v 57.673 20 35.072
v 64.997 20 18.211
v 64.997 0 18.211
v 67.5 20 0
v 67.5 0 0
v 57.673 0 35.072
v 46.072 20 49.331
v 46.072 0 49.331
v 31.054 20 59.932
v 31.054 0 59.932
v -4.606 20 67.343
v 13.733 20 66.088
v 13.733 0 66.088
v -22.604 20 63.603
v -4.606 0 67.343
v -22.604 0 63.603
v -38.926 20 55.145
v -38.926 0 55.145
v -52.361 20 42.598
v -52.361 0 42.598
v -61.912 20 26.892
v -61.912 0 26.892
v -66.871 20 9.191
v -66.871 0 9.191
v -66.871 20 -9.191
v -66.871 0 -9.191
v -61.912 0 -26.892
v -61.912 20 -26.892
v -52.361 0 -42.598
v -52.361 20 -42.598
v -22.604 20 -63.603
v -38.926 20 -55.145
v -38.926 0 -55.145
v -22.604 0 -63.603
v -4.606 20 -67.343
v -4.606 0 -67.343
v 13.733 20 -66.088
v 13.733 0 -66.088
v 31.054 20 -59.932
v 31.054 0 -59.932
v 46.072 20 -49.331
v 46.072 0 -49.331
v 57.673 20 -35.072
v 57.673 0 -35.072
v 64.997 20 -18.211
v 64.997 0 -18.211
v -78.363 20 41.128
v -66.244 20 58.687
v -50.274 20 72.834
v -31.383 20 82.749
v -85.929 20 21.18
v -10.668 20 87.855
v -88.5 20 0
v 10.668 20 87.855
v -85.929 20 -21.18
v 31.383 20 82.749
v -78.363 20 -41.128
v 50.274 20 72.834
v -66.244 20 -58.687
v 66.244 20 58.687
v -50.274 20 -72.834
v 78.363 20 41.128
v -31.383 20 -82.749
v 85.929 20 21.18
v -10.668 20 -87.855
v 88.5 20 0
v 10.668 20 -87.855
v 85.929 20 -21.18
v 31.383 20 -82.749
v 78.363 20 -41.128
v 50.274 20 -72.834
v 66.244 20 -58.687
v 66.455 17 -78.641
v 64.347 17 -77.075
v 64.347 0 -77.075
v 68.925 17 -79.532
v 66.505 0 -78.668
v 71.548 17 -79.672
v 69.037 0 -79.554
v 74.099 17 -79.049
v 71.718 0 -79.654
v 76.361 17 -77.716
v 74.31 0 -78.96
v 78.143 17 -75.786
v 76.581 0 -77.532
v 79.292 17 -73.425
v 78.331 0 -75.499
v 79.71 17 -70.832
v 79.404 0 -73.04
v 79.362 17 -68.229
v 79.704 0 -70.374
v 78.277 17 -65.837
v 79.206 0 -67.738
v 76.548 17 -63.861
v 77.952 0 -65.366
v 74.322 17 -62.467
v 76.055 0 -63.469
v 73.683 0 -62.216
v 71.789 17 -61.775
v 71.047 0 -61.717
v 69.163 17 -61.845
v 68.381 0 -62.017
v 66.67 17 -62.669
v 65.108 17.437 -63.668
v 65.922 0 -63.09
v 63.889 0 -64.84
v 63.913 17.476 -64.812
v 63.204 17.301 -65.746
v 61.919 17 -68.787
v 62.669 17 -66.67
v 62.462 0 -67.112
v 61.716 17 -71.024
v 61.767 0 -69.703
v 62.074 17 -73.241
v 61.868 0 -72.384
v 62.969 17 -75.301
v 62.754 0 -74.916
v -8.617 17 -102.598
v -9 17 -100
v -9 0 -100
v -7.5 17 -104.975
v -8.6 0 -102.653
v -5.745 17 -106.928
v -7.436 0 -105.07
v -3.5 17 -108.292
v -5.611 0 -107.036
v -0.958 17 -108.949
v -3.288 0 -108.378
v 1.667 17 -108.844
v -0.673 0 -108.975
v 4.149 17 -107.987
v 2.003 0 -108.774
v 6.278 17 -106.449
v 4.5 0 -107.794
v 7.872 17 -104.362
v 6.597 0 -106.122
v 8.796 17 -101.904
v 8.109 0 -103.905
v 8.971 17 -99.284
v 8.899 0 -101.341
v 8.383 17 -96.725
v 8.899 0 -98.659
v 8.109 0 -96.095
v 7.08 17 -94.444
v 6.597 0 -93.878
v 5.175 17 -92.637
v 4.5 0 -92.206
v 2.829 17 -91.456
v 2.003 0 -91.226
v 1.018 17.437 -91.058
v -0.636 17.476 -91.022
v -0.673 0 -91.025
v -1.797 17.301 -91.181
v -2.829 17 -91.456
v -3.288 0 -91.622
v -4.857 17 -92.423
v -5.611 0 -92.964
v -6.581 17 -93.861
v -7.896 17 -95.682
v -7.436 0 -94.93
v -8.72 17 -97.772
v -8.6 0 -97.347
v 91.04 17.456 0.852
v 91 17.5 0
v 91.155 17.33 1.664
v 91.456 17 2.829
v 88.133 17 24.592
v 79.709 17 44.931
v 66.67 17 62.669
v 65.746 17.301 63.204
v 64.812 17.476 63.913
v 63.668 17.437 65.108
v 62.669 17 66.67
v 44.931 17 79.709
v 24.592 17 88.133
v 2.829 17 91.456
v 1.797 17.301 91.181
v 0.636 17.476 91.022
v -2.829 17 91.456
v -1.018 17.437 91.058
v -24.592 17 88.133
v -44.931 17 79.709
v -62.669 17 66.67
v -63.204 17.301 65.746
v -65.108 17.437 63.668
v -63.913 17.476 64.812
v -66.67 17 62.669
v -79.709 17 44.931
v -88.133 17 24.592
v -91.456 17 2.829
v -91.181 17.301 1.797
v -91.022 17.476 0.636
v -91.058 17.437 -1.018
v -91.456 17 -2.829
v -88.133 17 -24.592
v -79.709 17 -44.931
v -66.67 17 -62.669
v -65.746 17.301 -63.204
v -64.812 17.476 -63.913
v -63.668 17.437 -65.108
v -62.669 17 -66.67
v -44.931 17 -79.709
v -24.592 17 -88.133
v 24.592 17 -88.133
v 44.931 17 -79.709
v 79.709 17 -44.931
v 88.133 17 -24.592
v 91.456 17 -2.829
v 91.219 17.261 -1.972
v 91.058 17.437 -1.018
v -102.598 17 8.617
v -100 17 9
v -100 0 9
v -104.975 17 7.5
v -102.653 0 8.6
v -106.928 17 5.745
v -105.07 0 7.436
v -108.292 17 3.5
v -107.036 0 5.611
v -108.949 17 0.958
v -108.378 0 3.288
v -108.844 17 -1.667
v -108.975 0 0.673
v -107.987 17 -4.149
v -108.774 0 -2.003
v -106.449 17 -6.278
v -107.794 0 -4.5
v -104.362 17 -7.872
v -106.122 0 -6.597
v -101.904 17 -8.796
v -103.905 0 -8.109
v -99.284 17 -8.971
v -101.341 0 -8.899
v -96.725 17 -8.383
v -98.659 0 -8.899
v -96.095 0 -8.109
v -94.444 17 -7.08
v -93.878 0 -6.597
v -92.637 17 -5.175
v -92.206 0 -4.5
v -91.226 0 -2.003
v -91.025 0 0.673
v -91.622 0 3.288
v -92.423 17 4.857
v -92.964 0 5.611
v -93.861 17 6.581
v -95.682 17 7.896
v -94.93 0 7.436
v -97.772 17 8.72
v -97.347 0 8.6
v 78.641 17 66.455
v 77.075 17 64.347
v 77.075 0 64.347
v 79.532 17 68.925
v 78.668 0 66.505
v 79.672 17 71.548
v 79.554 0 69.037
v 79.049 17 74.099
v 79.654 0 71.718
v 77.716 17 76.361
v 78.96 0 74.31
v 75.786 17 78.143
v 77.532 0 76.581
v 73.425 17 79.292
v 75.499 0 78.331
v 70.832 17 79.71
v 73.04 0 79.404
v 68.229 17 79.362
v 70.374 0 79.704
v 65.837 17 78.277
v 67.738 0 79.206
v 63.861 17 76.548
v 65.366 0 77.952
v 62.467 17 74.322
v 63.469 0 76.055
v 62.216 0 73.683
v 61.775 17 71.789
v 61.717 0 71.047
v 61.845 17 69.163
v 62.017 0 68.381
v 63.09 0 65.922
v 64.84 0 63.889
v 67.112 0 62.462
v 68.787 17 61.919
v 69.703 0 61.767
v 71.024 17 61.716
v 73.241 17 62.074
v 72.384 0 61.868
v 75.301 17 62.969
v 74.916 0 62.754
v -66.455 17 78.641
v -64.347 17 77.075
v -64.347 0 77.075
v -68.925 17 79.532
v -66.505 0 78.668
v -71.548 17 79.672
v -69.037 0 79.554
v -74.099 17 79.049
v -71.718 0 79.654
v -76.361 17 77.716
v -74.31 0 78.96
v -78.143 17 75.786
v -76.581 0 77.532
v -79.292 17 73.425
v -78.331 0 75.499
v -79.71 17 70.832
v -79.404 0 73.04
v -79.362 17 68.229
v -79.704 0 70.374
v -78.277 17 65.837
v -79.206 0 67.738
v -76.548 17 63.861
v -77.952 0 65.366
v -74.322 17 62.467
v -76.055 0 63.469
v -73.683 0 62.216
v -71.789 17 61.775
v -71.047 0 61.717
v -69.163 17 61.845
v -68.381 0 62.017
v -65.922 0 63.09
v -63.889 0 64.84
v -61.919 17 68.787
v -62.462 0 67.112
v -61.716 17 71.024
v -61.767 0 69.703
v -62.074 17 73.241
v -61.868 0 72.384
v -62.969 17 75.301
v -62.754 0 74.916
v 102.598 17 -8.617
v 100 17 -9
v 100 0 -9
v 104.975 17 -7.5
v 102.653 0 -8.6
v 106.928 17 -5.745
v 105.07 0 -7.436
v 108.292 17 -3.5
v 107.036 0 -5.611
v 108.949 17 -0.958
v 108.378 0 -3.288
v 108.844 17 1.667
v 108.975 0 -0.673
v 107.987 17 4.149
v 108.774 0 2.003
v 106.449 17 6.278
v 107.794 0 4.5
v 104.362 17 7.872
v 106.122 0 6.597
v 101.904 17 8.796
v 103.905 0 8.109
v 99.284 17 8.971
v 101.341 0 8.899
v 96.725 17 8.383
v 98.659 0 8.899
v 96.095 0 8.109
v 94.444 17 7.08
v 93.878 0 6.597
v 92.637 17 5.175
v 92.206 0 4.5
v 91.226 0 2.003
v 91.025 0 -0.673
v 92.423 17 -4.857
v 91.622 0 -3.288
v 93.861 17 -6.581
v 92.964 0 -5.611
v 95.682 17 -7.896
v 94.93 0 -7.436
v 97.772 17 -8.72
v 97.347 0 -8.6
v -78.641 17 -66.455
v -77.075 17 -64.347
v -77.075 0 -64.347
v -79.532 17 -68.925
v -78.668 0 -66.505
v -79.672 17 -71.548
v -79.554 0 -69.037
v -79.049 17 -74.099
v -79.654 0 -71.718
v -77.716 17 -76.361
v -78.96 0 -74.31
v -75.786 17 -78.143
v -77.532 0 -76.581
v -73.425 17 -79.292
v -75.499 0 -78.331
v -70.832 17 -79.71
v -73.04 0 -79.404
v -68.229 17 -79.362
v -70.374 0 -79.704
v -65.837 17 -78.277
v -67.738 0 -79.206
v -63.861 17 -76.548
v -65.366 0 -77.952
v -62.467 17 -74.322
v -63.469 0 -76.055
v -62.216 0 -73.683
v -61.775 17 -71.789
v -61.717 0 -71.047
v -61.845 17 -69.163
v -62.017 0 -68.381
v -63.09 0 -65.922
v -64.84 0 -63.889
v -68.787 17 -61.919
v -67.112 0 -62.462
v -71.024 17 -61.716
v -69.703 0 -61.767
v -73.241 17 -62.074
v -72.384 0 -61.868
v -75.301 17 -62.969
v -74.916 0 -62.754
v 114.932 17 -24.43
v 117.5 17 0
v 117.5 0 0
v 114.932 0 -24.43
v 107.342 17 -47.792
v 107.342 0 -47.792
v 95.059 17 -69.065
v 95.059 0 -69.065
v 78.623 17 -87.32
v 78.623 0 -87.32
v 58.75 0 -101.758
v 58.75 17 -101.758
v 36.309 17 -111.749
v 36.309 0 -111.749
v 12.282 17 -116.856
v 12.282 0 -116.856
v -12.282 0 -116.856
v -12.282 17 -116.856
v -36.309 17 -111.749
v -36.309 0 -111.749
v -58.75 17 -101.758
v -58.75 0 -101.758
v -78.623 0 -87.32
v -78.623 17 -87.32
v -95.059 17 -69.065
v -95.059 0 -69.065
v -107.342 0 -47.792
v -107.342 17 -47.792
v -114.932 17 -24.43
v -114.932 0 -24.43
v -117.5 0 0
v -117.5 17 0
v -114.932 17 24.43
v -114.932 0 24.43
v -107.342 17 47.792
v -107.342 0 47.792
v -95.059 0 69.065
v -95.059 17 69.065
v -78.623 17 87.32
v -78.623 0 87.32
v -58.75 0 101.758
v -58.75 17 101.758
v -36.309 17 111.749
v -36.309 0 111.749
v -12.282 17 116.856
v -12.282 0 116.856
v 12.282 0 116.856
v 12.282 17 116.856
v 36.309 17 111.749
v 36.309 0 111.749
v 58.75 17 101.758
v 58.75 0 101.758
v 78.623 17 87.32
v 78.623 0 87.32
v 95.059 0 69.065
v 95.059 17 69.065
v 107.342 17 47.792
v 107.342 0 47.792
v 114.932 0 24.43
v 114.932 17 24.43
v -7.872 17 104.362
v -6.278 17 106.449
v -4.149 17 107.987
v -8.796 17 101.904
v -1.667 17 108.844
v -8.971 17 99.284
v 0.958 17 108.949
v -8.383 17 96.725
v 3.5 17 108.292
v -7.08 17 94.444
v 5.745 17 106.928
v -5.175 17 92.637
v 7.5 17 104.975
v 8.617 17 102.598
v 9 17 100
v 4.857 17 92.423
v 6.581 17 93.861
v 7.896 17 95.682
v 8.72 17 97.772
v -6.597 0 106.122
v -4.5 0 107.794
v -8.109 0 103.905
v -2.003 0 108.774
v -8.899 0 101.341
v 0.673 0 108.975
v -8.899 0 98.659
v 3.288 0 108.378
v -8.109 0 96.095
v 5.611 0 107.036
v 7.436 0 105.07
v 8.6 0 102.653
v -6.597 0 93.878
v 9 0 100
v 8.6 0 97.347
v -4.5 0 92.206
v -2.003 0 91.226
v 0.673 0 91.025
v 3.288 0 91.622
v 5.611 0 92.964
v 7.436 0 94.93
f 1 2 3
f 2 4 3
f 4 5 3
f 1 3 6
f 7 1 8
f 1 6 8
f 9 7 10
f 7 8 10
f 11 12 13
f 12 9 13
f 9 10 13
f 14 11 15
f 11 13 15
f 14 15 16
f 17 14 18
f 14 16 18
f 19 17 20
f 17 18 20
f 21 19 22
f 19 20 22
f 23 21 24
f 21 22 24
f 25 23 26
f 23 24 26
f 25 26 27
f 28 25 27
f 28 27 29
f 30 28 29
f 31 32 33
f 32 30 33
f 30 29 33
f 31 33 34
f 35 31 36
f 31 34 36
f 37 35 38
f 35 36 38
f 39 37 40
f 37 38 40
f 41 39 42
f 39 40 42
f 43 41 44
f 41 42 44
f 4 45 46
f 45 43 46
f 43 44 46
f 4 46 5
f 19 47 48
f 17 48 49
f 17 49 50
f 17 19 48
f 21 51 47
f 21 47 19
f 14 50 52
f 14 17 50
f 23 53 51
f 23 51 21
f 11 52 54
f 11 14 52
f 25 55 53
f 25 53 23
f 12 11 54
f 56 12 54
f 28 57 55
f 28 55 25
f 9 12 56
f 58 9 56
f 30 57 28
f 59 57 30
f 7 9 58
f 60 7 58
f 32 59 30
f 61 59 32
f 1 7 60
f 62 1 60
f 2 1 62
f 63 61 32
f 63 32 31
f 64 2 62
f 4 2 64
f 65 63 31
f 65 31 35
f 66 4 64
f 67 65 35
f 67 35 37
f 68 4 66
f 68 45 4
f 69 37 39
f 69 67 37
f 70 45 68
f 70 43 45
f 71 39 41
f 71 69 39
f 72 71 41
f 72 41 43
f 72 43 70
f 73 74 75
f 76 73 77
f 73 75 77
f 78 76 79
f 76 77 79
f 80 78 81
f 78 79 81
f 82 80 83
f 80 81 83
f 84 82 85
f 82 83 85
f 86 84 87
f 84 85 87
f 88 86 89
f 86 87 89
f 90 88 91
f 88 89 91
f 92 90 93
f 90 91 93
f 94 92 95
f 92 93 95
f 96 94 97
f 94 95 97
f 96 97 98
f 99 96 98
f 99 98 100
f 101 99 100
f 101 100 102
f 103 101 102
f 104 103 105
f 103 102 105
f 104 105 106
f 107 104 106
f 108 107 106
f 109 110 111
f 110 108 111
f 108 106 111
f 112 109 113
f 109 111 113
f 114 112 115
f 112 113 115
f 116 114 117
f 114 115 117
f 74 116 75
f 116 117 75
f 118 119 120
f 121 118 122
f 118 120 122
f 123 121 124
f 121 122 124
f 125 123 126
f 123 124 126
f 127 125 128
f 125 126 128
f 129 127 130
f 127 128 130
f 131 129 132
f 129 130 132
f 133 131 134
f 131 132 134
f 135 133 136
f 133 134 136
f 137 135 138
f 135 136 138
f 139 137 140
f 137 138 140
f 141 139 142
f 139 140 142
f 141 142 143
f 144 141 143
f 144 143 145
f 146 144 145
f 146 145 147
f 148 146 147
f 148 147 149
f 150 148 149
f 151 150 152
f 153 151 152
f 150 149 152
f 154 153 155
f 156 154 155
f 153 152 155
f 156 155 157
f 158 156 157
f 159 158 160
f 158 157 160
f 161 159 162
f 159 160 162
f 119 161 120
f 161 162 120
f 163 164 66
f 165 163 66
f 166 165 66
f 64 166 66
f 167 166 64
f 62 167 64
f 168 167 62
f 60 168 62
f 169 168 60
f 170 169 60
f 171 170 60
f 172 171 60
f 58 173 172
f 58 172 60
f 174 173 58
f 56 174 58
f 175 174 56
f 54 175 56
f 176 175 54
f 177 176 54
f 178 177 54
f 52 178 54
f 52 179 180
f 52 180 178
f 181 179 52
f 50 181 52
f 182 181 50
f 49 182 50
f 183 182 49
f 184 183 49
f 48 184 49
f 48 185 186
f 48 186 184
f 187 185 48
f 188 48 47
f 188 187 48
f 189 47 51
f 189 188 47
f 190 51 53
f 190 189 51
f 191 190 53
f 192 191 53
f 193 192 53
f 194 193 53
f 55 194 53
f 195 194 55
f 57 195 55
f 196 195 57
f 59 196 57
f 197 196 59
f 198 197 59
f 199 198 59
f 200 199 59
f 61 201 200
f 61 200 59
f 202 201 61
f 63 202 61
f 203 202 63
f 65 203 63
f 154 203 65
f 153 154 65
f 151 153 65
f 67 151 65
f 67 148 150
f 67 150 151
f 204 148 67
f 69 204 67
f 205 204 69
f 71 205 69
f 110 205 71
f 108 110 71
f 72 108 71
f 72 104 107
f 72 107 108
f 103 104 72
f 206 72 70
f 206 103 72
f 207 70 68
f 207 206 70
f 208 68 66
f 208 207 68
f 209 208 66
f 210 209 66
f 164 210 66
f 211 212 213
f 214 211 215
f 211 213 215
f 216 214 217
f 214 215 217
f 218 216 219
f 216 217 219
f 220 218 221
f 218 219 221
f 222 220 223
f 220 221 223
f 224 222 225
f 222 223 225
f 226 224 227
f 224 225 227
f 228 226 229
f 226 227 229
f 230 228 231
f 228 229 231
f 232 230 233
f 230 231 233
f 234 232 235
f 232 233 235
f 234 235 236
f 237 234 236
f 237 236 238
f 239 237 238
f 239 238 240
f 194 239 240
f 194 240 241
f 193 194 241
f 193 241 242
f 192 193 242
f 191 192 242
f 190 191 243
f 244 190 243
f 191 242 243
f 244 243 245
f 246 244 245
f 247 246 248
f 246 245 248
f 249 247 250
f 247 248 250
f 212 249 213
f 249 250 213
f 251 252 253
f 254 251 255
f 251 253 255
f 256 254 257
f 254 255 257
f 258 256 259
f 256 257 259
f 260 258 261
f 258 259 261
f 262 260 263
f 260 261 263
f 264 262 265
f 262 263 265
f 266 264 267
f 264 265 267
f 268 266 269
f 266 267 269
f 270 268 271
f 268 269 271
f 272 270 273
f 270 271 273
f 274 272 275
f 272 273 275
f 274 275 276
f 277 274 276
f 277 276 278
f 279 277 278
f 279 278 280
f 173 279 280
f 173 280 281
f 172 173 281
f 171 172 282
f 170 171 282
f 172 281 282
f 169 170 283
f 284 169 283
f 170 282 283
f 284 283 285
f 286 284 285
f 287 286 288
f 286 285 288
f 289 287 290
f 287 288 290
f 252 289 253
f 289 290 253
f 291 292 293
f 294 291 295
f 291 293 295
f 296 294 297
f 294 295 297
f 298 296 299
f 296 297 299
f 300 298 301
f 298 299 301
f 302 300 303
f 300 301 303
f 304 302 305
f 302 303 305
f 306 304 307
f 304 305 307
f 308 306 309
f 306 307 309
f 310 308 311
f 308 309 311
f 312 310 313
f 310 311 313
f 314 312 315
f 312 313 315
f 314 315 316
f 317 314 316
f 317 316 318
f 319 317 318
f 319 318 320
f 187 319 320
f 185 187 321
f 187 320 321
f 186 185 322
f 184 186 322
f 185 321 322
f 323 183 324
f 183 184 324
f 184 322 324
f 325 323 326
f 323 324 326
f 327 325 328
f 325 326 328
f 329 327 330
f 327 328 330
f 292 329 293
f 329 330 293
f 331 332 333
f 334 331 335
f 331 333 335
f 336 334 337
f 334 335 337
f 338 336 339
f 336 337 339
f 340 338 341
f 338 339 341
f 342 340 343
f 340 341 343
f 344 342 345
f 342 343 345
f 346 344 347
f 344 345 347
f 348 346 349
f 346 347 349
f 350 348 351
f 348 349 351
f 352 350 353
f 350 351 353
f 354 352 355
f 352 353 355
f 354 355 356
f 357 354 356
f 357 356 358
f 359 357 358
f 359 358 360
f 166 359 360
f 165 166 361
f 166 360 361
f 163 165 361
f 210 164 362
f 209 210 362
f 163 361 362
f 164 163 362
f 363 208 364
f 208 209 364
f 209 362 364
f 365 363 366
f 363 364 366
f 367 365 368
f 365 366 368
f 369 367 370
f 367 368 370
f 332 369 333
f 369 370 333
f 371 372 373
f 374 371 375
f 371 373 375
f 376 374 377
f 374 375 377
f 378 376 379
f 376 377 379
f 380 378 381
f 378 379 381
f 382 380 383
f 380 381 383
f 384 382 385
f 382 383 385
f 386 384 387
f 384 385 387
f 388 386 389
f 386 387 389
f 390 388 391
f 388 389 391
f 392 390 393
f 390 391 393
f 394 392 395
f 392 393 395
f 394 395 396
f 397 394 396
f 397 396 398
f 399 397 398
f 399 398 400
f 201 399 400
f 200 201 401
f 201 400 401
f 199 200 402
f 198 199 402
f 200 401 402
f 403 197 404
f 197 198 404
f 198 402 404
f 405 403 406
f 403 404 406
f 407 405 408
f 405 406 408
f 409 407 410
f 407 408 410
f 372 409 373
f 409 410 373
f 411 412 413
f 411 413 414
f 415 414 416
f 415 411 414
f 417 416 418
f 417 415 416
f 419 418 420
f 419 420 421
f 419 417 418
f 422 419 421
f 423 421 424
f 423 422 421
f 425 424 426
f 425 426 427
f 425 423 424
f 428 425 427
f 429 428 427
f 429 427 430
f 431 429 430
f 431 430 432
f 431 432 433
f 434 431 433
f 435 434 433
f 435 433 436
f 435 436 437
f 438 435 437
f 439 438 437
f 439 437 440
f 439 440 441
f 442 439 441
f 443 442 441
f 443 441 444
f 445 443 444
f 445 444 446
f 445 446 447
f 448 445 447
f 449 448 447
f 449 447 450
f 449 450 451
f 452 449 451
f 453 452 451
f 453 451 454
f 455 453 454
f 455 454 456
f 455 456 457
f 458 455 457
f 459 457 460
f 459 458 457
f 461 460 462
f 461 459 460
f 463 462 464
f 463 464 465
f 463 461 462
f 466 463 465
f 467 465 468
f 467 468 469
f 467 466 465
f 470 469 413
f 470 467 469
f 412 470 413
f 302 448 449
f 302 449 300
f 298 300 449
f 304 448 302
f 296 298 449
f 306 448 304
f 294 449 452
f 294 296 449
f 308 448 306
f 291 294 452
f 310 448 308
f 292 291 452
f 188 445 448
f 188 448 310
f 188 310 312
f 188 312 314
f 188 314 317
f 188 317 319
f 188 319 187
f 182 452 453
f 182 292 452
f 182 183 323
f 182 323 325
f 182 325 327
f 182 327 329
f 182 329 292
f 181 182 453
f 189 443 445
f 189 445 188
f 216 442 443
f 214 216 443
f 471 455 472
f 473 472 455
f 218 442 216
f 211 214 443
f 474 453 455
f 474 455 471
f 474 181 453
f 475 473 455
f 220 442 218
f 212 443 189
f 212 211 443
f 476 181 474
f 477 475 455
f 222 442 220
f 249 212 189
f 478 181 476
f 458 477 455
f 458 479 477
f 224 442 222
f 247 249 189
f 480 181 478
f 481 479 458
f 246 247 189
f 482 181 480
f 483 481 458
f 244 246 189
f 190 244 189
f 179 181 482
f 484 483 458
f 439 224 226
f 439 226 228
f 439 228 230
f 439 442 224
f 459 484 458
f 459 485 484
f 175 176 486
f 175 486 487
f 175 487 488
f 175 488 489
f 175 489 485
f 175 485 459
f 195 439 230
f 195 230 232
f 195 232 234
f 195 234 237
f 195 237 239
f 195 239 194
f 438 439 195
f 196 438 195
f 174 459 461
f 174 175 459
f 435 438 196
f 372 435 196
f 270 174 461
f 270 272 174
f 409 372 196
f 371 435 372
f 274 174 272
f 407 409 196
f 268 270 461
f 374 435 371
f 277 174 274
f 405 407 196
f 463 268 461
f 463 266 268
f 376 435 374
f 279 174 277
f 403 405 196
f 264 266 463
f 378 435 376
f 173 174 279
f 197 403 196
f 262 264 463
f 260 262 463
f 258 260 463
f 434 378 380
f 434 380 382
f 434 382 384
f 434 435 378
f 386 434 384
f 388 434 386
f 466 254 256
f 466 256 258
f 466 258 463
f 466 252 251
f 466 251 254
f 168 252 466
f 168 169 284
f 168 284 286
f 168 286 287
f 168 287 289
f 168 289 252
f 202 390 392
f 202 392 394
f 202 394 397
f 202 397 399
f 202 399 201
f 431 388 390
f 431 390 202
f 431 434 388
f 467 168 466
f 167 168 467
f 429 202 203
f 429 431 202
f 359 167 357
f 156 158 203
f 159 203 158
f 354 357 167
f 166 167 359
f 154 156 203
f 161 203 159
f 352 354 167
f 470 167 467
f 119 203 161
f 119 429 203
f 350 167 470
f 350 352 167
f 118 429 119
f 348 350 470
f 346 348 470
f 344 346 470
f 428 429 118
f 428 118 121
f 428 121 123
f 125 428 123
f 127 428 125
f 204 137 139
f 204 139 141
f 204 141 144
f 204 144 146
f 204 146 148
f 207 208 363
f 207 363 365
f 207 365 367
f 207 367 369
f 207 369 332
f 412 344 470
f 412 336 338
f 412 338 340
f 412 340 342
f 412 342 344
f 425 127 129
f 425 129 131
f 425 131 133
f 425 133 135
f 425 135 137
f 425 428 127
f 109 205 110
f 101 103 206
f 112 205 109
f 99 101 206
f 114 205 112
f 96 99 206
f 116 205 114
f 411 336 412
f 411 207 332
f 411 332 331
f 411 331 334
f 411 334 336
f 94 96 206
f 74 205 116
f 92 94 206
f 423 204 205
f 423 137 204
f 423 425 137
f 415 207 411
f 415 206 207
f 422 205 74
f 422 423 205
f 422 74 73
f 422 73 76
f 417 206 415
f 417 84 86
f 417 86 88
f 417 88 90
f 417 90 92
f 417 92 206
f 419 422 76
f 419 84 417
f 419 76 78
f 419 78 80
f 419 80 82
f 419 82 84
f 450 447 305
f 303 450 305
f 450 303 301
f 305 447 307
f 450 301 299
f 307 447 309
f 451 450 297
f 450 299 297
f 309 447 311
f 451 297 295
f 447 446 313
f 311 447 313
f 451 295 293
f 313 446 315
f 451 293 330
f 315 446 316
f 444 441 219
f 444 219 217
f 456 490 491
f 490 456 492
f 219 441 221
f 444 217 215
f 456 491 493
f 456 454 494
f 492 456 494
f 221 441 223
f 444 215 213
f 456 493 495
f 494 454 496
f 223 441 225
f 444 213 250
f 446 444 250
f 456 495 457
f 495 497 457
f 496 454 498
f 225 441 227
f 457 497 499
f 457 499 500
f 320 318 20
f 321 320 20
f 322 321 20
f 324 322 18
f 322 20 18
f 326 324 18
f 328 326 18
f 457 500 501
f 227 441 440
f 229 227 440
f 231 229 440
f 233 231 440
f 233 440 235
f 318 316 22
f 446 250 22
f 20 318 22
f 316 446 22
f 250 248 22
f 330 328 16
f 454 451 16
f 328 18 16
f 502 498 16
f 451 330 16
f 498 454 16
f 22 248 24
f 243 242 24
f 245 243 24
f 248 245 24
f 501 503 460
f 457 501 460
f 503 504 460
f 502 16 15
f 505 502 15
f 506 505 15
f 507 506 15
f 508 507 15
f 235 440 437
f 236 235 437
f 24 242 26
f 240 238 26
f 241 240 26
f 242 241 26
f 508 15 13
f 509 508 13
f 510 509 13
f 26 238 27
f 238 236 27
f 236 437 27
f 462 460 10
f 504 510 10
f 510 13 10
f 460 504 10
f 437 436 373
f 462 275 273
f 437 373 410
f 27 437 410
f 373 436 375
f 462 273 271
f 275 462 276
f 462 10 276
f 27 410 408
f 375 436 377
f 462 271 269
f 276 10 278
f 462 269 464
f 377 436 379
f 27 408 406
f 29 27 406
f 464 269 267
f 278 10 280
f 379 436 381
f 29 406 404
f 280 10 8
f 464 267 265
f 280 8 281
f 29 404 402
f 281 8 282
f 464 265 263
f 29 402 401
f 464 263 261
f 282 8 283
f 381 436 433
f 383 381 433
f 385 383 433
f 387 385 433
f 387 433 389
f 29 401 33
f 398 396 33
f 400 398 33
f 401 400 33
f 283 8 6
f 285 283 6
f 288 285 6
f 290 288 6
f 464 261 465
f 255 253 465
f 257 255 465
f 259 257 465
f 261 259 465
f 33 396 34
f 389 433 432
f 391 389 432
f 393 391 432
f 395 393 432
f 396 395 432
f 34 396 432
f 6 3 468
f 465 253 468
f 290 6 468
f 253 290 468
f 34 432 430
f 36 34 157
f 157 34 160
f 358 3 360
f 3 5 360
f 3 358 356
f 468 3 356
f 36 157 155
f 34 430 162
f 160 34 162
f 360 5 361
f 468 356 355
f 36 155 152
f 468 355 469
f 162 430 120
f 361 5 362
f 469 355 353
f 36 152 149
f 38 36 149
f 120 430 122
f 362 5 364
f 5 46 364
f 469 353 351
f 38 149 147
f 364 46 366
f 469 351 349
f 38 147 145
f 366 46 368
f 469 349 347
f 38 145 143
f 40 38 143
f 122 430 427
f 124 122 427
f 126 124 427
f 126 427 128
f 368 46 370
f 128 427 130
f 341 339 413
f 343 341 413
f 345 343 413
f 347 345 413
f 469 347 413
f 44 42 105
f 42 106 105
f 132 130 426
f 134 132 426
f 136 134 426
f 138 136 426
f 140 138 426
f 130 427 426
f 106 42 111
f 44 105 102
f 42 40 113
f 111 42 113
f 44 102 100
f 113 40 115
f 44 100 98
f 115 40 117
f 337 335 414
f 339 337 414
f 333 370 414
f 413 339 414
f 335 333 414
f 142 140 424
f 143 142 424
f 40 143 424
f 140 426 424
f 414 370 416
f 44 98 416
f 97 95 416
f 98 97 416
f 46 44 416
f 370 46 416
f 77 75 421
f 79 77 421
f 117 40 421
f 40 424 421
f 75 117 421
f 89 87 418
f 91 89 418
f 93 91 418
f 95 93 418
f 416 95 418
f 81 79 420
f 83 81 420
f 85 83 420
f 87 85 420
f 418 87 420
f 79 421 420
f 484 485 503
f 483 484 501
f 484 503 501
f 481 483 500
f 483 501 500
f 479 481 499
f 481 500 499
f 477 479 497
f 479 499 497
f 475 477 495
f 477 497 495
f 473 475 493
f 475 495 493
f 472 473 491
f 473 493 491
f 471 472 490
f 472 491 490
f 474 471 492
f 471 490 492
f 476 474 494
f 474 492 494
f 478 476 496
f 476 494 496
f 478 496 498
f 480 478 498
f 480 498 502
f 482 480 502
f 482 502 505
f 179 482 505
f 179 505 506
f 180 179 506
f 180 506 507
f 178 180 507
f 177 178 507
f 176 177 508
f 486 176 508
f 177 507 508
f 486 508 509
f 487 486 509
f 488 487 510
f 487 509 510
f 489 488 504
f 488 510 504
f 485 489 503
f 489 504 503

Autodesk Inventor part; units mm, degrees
ref_plane "YZ Plane" through (0, 0, 0) normal (1, 0, 0) x (0, 1, 0)
ref_plane "XZ Plane" through (0, 0, 0) normal (0, 1, 0) x (-1, 0, 0)
ref_plane "XY Plane" through (0, 0, 0) normal (0, 0, 1) x (1, 0, 0)
sketch "Sketch1" plane through (0, 0, 0) normal (0, 0, 1) x (1, 0, 0)
  line L0 (67.5, 20) -> (67.5, 0)
  line L1 (67.5, 0) -> (117.5, 0)
  line L2 (117.5, 0) -> (117.5, 17)
  line L3 (117.5, 17) -> (91.5, 17)
  line L4 (91.5, 17) -> (91.5, 20)
  line L5 (91.5, 20) -> (67.5, 20)
  line L6 (0, 0) -> (0, 46.5361)
  dimension "d0" = 50
  dimension "d1" = 24
  dimension "d2" = 135
  dimension "d3" = 17
  dimension "d4" = 20
revolve "Revolution1" add sketch "Sketch1" angle 360 about axis through (0, 0, 0) along (0, 1, 0)
chamfer "Chamfer1" distance 3 angle 45 1 edges at (-91.5, 20, 0)
sketch "Sketch2" plane through (0, 17, 0) normal (0, 1, 0) x (1, 0, 0)
  circle A0 centre (0, 0) radius 100
  point P0 (-100, 0)
  dimension "d9" = 200
hole "Hole1" at (-100, 17, 0) direction (0, -1, 0) diameter 18 end through all both
pattern_circular "Circular Pattern1" count 8 over 360 about axis through (0, 10, 0) along (0, 1, 0) of "Hole1"
properties part number "DMF Flange exit 2.0"
